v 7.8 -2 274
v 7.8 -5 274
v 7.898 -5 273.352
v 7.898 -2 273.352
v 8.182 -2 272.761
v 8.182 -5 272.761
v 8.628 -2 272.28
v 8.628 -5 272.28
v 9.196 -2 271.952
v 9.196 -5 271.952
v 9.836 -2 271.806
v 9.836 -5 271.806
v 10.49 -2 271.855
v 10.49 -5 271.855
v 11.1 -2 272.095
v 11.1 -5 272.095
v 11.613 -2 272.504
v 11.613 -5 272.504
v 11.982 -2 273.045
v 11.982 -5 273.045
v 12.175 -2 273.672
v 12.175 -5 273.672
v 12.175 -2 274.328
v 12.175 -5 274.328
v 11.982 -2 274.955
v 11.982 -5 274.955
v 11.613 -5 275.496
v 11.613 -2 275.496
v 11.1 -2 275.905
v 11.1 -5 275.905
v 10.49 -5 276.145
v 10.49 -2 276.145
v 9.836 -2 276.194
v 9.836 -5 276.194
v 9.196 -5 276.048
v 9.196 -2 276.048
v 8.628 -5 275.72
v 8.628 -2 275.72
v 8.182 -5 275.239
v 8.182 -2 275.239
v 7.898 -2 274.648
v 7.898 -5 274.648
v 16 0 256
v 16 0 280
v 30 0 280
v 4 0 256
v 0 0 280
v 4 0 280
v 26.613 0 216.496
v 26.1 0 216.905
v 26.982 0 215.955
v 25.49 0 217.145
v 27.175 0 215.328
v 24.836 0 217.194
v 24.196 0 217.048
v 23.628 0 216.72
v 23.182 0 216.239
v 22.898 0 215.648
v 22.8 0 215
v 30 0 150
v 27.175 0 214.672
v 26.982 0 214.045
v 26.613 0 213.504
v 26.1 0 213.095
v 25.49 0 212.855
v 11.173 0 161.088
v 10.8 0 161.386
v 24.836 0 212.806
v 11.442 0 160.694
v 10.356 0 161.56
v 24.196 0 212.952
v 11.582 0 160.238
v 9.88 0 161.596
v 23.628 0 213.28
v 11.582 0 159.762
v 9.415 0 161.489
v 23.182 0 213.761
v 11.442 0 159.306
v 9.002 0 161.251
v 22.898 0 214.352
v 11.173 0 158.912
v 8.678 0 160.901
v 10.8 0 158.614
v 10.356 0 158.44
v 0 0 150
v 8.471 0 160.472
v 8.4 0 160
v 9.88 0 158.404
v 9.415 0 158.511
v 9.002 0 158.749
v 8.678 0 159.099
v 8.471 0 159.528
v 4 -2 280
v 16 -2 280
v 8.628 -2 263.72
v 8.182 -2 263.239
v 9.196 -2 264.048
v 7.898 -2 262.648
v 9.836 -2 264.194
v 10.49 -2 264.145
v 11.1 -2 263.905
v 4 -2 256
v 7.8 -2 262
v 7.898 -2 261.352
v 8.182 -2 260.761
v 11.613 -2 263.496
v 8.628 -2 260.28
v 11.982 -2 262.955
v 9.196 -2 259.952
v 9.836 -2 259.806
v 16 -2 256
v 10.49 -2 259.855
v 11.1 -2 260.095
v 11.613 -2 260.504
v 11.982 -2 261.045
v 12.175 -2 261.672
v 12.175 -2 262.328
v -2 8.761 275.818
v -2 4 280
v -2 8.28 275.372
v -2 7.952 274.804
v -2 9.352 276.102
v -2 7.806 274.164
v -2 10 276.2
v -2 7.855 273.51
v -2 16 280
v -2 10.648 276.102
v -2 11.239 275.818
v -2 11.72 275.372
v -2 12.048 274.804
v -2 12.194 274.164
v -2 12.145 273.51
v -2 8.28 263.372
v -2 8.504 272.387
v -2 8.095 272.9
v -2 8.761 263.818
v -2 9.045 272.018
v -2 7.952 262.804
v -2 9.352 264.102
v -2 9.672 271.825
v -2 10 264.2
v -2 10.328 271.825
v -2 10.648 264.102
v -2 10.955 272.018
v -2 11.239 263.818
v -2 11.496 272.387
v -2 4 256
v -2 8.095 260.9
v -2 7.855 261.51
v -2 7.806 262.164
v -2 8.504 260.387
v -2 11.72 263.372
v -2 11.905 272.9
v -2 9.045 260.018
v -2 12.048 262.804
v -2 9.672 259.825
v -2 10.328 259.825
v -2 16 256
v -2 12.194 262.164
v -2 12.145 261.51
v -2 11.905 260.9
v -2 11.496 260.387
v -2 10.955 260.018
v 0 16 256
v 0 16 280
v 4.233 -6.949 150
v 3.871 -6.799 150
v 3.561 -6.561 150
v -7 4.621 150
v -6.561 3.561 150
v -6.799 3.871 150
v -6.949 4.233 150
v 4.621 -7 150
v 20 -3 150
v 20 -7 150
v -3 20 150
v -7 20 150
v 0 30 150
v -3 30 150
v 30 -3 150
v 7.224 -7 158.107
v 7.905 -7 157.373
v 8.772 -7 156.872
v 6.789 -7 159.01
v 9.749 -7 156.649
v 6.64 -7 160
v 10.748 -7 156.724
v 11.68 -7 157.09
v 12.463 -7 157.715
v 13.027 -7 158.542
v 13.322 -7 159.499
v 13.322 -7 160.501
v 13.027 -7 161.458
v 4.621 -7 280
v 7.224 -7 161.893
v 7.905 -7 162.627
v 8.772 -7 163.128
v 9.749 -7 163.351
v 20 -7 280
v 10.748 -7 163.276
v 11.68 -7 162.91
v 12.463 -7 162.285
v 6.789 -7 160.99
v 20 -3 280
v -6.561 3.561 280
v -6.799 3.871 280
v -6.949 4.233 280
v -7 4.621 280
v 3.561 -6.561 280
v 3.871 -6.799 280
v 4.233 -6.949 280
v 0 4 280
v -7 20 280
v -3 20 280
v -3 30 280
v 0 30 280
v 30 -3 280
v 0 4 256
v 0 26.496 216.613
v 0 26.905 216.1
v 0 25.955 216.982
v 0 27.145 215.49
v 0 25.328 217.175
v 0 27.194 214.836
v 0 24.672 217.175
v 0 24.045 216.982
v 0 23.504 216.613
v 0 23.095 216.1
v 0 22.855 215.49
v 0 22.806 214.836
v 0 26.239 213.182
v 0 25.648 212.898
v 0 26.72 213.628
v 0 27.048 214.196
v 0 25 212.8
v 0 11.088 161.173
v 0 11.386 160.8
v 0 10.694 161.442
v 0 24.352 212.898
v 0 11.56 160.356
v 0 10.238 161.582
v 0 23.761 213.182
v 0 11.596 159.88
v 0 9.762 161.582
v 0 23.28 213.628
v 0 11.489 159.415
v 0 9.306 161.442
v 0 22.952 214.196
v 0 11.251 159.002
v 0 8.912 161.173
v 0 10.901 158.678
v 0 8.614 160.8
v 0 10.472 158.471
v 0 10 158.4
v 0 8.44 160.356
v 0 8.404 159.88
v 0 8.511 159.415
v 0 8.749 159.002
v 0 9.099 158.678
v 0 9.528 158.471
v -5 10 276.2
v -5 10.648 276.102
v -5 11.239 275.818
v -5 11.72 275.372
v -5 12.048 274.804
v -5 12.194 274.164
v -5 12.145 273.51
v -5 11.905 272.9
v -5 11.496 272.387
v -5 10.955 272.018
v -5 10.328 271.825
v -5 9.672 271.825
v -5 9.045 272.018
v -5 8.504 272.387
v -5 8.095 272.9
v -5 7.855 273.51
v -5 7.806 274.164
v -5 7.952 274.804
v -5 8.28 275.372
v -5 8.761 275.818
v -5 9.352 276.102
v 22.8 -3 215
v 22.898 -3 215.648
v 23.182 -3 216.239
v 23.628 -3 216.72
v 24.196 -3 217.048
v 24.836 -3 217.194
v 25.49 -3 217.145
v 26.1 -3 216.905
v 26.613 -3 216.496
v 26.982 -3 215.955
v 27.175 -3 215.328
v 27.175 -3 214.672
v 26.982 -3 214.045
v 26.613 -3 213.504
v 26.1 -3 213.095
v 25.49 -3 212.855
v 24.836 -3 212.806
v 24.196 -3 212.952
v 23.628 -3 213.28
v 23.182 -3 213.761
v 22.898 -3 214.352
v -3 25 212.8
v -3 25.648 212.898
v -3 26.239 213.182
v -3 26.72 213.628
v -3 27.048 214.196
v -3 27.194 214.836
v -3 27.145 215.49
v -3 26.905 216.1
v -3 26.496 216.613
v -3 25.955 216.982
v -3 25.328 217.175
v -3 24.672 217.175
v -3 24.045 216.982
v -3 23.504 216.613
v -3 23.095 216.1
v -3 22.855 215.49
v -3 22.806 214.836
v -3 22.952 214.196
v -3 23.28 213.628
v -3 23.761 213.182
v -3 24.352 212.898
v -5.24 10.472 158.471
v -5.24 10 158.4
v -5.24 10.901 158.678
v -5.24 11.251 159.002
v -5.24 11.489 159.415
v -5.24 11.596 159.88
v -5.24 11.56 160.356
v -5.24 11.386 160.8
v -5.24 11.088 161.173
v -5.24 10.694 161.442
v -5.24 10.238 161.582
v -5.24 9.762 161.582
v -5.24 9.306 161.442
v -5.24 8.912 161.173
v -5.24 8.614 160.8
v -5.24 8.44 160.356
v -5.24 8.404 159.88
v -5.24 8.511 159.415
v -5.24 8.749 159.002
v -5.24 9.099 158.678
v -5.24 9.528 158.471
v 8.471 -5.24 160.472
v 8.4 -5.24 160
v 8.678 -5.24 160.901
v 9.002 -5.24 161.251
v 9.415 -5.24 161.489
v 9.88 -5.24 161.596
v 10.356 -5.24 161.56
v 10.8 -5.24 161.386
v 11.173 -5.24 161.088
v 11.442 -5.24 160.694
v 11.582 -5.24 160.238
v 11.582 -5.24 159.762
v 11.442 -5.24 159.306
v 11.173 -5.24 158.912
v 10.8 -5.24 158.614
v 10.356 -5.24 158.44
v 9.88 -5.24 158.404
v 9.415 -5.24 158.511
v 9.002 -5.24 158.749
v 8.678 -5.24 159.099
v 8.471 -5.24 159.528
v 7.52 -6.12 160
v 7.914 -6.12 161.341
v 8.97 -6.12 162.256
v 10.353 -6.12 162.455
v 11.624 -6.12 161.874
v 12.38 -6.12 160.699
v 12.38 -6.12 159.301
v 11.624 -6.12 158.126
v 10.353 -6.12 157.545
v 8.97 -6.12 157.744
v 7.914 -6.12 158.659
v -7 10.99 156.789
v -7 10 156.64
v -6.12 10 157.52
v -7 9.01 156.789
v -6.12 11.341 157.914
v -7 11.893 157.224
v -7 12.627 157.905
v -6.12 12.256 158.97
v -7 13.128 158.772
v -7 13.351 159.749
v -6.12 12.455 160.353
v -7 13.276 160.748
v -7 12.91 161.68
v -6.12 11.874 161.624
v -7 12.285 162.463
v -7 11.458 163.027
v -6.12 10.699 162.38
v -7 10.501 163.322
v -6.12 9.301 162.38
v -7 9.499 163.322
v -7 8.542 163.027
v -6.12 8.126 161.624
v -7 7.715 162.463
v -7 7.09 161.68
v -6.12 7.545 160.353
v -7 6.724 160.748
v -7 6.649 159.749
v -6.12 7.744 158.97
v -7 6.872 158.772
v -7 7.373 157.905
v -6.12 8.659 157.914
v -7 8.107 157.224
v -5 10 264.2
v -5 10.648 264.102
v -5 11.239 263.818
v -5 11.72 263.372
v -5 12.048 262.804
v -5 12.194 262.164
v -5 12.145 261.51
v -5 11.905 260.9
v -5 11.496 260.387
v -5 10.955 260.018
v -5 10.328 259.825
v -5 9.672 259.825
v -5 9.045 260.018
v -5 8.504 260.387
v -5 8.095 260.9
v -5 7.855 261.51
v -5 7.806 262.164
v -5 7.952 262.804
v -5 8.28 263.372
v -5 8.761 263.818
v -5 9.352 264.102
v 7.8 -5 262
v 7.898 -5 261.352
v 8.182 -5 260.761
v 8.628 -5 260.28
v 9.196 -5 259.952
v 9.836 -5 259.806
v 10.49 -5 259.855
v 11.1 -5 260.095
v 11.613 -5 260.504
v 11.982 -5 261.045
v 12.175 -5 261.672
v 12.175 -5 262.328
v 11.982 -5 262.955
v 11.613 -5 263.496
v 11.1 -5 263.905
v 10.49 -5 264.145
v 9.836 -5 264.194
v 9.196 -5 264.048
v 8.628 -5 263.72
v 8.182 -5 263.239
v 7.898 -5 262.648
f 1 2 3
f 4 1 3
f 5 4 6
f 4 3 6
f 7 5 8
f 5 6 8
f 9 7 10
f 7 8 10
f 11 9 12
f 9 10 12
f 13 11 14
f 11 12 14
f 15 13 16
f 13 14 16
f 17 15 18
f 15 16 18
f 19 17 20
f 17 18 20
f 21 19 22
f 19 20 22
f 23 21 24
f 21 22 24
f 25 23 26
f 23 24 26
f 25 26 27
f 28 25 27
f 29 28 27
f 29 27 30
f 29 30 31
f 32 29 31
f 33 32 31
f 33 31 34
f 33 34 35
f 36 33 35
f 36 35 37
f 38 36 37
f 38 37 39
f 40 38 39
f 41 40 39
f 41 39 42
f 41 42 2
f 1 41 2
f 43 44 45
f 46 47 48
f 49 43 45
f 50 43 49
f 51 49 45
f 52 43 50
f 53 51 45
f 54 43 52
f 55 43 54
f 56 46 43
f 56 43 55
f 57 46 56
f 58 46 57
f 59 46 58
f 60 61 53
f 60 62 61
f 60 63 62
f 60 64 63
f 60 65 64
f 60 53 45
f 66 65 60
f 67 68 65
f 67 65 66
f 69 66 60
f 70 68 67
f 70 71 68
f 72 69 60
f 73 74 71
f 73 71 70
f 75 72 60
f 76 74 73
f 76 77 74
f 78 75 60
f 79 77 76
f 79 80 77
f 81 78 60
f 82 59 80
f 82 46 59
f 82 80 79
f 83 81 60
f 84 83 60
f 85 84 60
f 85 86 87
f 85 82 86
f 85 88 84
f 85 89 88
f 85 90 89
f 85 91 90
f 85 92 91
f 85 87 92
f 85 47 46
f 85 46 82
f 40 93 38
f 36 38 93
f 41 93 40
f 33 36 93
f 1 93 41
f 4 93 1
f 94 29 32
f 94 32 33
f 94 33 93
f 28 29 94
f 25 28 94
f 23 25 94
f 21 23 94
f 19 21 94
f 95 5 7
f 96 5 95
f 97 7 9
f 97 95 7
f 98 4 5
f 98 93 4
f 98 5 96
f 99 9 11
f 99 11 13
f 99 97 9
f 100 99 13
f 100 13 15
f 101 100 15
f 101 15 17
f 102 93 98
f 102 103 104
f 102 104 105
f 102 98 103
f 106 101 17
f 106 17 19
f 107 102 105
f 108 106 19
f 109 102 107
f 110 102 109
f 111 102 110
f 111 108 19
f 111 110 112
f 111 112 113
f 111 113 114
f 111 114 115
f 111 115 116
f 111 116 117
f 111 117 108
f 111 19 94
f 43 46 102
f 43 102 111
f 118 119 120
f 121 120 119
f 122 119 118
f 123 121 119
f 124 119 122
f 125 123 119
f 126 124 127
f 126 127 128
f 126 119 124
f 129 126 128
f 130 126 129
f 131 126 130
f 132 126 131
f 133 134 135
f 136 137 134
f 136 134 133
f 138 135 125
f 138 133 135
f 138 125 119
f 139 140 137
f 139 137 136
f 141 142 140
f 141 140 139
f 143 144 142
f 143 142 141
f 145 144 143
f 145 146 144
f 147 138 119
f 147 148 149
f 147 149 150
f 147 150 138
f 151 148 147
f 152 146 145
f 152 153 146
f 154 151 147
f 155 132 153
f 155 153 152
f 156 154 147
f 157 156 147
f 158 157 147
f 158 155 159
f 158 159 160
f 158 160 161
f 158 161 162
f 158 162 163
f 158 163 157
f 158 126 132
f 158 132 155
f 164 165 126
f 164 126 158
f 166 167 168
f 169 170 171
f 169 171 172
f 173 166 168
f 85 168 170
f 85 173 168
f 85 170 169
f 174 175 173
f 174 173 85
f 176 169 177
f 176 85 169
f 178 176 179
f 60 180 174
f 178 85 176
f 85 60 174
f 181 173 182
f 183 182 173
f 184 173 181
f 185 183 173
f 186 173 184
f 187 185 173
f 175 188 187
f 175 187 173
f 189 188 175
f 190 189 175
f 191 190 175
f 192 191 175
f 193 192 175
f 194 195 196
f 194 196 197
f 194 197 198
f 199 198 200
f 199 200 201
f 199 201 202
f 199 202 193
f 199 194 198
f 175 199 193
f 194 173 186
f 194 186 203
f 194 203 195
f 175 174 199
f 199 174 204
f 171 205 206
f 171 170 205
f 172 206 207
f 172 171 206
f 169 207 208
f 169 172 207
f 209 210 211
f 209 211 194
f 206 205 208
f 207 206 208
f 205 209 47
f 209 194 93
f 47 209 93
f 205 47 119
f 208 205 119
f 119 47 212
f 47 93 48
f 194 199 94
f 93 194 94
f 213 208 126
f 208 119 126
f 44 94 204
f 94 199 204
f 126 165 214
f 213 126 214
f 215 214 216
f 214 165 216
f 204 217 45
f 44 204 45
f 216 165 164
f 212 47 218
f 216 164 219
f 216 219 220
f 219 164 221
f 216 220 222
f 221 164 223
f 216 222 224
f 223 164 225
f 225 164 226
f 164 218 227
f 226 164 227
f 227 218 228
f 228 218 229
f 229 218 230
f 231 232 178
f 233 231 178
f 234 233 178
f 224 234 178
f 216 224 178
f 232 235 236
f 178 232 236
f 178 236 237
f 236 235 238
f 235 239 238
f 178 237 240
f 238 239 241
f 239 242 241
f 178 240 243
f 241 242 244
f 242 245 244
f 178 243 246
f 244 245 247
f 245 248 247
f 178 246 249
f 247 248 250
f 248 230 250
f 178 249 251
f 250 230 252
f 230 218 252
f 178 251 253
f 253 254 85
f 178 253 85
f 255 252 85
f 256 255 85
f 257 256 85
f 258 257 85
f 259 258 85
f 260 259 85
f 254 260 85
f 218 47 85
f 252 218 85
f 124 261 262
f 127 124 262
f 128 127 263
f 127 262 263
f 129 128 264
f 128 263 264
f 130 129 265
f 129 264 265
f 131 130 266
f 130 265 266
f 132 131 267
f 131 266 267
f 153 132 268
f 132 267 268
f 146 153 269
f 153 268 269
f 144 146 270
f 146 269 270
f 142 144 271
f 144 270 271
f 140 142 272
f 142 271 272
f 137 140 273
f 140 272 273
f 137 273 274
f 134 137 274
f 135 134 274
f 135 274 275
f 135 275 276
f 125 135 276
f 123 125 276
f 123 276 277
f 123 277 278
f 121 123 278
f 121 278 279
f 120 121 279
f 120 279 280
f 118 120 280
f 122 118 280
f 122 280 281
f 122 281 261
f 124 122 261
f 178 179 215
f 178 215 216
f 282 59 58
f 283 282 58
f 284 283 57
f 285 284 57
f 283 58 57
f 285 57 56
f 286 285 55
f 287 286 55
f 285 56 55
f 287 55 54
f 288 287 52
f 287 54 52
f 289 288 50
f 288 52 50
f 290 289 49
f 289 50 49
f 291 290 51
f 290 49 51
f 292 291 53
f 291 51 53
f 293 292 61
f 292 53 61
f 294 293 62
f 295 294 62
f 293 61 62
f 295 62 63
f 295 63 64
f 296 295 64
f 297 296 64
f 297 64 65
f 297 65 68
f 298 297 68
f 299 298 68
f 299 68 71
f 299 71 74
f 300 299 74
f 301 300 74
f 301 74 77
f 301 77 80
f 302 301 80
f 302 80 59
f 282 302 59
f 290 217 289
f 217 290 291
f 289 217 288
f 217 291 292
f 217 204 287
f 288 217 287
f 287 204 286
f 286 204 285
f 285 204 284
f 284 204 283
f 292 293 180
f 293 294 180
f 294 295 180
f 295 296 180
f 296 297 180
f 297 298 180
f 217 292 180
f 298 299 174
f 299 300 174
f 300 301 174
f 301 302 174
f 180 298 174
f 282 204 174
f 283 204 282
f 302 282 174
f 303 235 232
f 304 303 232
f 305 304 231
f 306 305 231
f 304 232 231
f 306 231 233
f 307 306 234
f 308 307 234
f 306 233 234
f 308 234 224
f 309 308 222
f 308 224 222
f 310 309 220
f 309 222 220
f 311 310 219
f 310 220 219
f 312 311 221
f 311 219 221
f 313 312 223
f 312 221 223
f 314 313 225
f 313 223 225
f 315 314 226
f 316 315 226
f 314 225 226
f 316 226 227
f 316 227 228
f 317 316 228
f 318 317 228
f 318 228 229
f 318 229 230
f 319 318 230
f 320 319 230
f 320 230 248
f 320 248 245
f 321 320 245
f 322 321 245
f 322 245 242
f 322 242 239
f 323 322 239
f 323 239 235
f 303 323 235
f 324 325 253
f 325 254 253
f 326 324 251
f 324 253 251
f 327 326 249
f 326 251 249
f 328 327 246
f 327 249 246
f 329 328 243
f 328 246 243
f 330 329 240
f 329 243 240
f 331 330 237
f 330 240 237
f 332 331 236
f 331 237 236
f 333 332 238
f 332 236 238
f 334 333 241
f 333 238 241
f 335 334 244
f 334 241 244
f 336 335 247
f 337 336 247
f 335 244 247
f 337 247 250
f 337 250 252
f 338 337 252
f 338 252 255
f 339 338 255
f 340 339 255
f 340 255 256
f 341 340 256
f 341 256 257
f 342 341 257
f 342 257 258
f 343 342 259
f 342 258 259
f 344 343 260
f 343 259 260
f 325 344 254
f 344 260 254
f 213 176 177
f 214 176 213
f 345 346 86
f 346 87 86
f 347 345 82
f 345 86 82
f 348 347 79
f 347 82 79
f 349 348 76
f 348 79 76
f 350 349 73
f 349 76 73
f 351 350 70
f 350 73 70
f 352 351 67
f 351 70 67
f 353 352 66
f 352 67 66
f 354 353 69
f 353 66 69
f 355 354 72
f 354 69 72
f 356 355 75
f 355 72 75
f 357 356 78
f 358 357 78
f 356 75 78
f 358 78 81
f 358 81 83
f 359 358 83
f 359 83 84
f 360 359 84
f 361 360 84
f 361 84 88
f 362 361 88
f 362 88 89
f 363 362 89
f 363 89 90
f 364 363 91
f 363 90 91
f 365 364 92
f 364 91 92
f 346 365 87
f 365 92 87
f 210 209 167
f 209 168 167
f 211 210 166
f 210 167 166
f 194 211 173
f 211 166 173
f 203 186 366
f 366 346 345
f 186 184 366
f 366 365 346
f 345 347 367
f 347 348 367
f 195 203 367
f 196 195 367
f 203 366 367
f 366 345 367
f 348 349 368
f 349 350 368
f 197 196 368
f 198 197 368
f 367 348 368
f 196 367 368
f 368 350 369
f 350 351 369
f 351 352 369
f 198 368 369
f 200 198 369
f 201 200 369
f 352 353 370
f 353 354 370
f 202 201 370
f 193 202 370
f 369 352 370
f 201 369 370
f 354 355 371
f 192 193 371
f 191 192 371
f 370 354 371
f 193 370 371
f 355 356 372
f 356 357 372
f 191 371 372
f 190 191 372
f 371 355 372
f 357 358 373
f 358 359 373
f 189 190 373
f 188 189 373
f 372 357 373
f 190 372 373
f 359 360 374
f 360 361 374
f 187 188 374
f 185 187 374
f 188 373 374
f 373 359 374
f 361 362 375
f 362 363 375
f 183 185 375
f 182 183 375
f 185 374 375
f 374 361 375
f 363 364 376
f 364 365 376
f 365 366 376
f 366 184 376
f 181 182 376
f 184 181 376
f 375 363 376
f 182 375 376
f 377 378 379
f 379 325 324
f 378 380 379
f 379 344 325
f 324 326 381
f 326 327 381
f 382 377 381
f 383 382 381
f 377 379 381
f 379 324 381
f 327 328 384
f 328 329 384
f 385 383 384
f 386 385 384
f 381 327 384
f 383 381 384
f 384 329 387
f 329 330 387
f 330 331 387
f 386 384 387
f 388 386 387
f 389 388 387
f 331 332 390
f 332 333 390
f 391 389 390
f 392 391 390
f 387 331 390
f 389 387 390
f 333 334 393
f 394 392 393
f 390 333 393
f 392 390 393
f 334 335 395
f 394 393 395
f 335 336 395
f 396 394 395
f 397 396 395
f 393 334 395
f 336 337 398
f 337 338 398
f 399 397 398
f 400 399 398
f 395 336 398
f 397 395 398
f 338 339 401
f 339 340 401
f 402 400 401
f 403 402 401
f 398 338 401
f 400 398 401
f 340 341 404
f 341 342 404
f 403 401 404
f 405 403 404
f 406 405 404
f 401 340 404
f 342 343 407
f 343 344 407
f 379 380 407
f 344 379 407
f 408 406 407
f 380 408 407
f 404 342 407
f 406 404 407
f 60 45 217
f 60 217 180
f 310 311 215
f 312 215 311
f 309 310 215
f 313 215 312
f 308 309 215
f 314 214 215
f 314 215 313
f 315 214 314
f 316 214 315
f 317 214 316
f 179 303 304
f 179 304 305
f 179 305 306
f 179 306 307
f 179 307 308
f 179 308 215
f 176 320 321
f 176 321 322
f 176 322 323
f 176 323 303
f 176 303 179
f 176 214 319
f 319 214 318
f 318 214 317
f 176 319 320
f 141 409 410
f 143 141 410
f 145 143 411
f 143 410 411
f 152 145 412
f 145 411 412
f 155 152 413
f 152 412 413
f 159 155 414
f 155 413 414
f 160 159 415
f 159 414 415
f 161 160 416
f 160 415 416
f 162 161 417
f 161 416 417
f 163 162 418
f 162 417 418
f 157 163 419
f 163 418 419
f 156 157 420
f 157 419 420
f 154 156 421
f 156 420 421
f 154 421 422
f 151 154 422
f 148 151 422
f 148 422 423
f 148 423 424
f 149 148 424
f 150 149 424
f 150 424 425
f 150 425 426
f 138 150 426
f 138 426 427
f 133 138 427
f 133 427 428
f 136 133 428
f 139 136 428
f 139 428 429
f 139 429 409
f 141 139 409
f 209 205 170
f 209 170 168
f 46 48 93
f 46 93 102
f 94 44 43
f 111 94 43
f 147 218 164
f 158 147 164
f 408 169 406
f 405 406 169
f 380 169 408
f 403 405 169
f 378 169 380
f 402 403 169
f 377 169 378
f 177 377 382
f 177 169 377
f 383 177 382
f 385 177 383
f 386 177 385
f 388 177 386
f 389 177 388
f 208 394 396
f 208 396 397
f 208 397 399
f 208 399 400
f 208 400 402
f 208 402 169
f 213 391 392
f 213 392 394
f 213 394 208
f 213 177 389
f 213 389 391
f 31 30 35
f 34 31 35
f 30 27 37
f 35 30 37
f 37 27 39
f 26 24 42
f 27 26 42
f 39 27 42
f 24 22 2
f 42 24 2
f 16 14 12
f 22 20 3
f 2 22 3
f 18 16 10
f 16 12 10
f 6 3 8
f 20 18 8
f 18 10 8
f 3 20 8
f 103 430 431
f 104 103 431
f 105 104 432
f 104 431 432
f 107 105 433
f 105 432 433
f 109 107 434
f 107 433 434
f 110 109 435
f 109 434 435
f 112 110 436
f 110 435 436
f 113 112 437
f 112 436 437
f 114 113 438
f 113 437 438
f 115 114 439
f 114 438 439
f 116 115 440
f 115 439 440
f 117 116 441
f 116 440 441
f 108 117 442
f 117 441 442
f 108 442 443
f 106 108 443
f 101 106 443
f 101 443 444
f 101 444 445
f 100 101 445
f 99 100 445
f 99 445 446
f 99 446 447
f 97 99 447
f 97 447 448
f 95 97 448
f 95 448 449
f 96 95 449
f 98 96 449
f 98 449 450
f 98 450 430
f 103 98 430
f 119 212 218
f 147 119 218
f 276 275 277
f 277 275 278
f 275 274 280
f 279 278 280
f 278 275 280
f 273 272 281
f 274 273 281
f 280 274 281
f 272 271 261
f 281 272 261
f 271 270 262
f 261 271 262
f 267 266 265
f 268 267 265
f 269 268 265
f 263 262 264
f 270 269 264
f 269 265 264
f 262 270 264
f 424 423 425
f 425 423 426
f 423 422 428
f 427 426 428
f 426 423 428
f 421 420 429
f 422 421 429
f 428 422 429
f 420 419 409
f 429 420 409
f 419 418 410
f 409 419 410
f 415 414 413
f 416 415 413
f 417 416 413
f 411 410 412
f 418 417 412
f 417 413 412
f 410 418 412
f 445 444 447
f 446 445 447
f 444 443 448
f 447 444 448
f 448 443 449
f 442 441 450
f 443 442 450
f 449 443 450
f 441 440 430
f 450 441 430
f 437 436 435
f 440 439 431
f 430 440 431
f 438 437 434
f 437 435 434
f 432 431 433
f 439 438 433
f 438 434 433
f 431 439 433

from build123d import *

# Parameters (mm, degrees)
BOSS_EXTRUDE1_DEPTH            = 130
FILLET1_R                      = 1.5
SKETCH2_W                      = 130
SKETCH2_H                      = 3
BOSS_EXTRUDE2_DEPTH            = 10
SKETCH4_W                      = 13
SKETCH4_H                      = 130
BOSS_EXTRUDE3_DEPTH            = 4
SKETCH6_W                      = 3
SKETCH6_H                      = 130
BOSS_EXTRUDE4_DEPTH            = 10
SKETCH5_W                      = 130
SKETCH5_H                      = 13
BOSS_EXTRUDE5_DEPTH            = 4
CSK_FOR_M3_SFHCS1_D            = 3.2
CSK_FOR_M3_SFHCS1_CSINK_D      = 6.72
CSK_FOR_M3_SFHCS1_CSINK_ANGLE  = 90
CSK_FOR_M3_SFHCS2_D            = 3.2
CSK_FOR_M3_SFHCS2_CSINK_D      = 6.72
CSK_FOR_M3_SFHCS2_CSINK_ANGLE  = 90
SKETCH13_W                     = 12
SKETCH13_H                     = 24
CUT_EXTRUDE1_DEPTH             = 2
F_4_4_4_4_DIAMETER_HOLE1_D     = 4.4
F_4_4_4_4_DIAMETER_HOLE1_DEPTH = 3
SKETCH16_W                     = 24
SKETCH16_H                     = 12
CUT_EXTRUDE2_DEPTH             = 2
F_4_4_4_4_DIAMETER_HOLE2_D     = 4.4
F_4_4_4_4_DIAMETER_HOLE2_DEPTH = 3
F_4_4_4_4_DIAMETER_HOLE3_D     = 4.4
F_4_4_4_4_DIAMETER_HOLE4_D     = 4.4


with BuildPart() as part:
    # Sketch1 → Boss-Extrude1 (new body)
    with BuildSketch(Plane.XY.offset(280)):
        Polygon((-7, 4), (4, -7), (7, -7), (7, -3), (20, -3), (20, 0), (0, 0), (0, 20), (-3, 20), (-3, 7), (-7, 7), align=None)
    extrude(amount=-BOSS_EXTRUDE1_DEPTH)

    # Fillet1
    fillet1_edges = [part.edges().sort_by_distance(p)[0] for p in [
        (4, -7, 215),
        (-7, 4, 215),
    ]]
    fillet(fillet1_edges, radius=FILLET1_R)

    # Sketch2 → Boss-Extrude2 (add)
    with BuildSketch(Plane(origin=(20, 0, 0), x_dir=(0, 0, -1), z_dir=(1, 0, 0))):
        with Locations((-215, -1.5)):
            Rectangle(SKETCH2_W, SKETCH2_H)
    extrude(amount=BOSS_EXTRUDE2_DEPTH)

    # Sketch4 → Boss-Extrude3 (add)
    with BuildSketch(Plane.XZ.offset(3)):
        with Locations((13.5, 215)):
            Rectangle(SKETCH4_W, SKETCH4_H)
    extrude(amount=BOSS_EXTRUDE3_DEPTH)

    # Sketch6 → Boss-Extrude4 (add)
    with BuildSketch(Plane(origin=(0, 20, 0), x_dir=(1, 0, 0), z_dir=(0, 1, 0))):
        with Locations((-1.5, -215)):
            Rectangle(SKETCH6_W, SKETCH6_H)
    extrude(amount=BOSS_EXTRUDE4_DEPTH)

    # Sketch5 → Boss-Extrude5 (add)
    with BuildSketch(Plane.ZY.offset(3)):
        with Locations((215, 13.5)):
            Rectangle(SKETCH5_W, SKETCH5_H)
    extrude(amount=BOSS_EXTRUDE5_DEPTH)

    # CSK for M3 SFHCS1 (through all)
    with Locations(Plane.ZY.offset(7)):
        with Locations((160, 10)):
            CounterSinkHole(CSK_FOR_M3_SFHCS1_D / 2, CSK_FOR_M3_SFHCS1_CSINK_D / 2, counter_sink_angle=CSK_FOR_M3_SFHCS1_CSINK_ANGLE)

    # CSK for M3 SFHCS2 (through all)
    with Locations(Plane.XZ.offset(7)):
        with Locations((10, 160)):
            CounterSinkHole(CSK_FOR_M3_SFHCS2_D / 2, CSK_FOR_M3_SFHCS2_CSINK_D / 2, counter_sink_angle=CSK_FOR_M3_SFHCS2_CSINK_ANGLE)

    # Sketch13 → Cut-Extrude1 (cut)
    with BuildSketch(Plane(origin=(0, 0, 0), x_dir=(1, 0, 0), z_dir=(0, 1, 0))):
        with Locations((10, -268)):
            Rectangle(SKETCH13_W, SKETCH13_H)
    extrude(amount=-CUT_EXTRUDE1_DEPTH, mode=Mode.SUBTRACT)

    # Ø4.4 (4.4) Diameter Hole1
    with Locations(Plane(origin=(0, -2, 0), x_dir=(1, 0, 0), z_dir=(0, 1, 0))):
        with Locations((10, -262), (10, -274)):
            Hole(F_4_4_4_4_DIAMETER_HOLE1_D / 2, depth=F_4_4_4_4_DIAMETER_HOLE1_DEPTH)

    # Sketch16 → Cut-Extrude2 (cut)
    with BuildSketch(Plane(origin=(0, 0, 0), x_dir=(0, 0, -1), z_dir=(1, 0, 0))):
        with Locations((-268, 10)):
            Rectangle(SKETCH16_W, SKETCH16_H)
    extrude(amount=-CUT_EXTRUDE2_DEPTH, mode=Mode.SUBTRACT)

    # Ø4.4 (4.4) Diameter Hole2
    with Locations(Plane(origin=(-2, 0, 0), x_dir=(0, 0, -1), z_dir=(1, 0, 0))):
        with Locations((-262, 10), (-274, 10)):
            Hole(F_4_4_4_4_DIAMETER_HOLE2_D / 2, depth=F_4_4_4_4_DIAMETER_HOLE2_DEPTH)

    # Ø4.4 (4.4) Diameter Hole3 (through all)
    with Locations(Plane.ZY.offset(3)):
        with Locations((215, 25)):
            Hole(F_4_4_4_4_DIAMETER_HOLE3_D / 2)

    # Ø4.4 (4.4) Diameter Hole4 (through all)
    with Locations(Plane.XZ.offset(3)):
        with Locations((25, 215)):
            Hole(F_4_4_4_4_DIAMETER_HOLE4_D / 2)


solid = part.part
